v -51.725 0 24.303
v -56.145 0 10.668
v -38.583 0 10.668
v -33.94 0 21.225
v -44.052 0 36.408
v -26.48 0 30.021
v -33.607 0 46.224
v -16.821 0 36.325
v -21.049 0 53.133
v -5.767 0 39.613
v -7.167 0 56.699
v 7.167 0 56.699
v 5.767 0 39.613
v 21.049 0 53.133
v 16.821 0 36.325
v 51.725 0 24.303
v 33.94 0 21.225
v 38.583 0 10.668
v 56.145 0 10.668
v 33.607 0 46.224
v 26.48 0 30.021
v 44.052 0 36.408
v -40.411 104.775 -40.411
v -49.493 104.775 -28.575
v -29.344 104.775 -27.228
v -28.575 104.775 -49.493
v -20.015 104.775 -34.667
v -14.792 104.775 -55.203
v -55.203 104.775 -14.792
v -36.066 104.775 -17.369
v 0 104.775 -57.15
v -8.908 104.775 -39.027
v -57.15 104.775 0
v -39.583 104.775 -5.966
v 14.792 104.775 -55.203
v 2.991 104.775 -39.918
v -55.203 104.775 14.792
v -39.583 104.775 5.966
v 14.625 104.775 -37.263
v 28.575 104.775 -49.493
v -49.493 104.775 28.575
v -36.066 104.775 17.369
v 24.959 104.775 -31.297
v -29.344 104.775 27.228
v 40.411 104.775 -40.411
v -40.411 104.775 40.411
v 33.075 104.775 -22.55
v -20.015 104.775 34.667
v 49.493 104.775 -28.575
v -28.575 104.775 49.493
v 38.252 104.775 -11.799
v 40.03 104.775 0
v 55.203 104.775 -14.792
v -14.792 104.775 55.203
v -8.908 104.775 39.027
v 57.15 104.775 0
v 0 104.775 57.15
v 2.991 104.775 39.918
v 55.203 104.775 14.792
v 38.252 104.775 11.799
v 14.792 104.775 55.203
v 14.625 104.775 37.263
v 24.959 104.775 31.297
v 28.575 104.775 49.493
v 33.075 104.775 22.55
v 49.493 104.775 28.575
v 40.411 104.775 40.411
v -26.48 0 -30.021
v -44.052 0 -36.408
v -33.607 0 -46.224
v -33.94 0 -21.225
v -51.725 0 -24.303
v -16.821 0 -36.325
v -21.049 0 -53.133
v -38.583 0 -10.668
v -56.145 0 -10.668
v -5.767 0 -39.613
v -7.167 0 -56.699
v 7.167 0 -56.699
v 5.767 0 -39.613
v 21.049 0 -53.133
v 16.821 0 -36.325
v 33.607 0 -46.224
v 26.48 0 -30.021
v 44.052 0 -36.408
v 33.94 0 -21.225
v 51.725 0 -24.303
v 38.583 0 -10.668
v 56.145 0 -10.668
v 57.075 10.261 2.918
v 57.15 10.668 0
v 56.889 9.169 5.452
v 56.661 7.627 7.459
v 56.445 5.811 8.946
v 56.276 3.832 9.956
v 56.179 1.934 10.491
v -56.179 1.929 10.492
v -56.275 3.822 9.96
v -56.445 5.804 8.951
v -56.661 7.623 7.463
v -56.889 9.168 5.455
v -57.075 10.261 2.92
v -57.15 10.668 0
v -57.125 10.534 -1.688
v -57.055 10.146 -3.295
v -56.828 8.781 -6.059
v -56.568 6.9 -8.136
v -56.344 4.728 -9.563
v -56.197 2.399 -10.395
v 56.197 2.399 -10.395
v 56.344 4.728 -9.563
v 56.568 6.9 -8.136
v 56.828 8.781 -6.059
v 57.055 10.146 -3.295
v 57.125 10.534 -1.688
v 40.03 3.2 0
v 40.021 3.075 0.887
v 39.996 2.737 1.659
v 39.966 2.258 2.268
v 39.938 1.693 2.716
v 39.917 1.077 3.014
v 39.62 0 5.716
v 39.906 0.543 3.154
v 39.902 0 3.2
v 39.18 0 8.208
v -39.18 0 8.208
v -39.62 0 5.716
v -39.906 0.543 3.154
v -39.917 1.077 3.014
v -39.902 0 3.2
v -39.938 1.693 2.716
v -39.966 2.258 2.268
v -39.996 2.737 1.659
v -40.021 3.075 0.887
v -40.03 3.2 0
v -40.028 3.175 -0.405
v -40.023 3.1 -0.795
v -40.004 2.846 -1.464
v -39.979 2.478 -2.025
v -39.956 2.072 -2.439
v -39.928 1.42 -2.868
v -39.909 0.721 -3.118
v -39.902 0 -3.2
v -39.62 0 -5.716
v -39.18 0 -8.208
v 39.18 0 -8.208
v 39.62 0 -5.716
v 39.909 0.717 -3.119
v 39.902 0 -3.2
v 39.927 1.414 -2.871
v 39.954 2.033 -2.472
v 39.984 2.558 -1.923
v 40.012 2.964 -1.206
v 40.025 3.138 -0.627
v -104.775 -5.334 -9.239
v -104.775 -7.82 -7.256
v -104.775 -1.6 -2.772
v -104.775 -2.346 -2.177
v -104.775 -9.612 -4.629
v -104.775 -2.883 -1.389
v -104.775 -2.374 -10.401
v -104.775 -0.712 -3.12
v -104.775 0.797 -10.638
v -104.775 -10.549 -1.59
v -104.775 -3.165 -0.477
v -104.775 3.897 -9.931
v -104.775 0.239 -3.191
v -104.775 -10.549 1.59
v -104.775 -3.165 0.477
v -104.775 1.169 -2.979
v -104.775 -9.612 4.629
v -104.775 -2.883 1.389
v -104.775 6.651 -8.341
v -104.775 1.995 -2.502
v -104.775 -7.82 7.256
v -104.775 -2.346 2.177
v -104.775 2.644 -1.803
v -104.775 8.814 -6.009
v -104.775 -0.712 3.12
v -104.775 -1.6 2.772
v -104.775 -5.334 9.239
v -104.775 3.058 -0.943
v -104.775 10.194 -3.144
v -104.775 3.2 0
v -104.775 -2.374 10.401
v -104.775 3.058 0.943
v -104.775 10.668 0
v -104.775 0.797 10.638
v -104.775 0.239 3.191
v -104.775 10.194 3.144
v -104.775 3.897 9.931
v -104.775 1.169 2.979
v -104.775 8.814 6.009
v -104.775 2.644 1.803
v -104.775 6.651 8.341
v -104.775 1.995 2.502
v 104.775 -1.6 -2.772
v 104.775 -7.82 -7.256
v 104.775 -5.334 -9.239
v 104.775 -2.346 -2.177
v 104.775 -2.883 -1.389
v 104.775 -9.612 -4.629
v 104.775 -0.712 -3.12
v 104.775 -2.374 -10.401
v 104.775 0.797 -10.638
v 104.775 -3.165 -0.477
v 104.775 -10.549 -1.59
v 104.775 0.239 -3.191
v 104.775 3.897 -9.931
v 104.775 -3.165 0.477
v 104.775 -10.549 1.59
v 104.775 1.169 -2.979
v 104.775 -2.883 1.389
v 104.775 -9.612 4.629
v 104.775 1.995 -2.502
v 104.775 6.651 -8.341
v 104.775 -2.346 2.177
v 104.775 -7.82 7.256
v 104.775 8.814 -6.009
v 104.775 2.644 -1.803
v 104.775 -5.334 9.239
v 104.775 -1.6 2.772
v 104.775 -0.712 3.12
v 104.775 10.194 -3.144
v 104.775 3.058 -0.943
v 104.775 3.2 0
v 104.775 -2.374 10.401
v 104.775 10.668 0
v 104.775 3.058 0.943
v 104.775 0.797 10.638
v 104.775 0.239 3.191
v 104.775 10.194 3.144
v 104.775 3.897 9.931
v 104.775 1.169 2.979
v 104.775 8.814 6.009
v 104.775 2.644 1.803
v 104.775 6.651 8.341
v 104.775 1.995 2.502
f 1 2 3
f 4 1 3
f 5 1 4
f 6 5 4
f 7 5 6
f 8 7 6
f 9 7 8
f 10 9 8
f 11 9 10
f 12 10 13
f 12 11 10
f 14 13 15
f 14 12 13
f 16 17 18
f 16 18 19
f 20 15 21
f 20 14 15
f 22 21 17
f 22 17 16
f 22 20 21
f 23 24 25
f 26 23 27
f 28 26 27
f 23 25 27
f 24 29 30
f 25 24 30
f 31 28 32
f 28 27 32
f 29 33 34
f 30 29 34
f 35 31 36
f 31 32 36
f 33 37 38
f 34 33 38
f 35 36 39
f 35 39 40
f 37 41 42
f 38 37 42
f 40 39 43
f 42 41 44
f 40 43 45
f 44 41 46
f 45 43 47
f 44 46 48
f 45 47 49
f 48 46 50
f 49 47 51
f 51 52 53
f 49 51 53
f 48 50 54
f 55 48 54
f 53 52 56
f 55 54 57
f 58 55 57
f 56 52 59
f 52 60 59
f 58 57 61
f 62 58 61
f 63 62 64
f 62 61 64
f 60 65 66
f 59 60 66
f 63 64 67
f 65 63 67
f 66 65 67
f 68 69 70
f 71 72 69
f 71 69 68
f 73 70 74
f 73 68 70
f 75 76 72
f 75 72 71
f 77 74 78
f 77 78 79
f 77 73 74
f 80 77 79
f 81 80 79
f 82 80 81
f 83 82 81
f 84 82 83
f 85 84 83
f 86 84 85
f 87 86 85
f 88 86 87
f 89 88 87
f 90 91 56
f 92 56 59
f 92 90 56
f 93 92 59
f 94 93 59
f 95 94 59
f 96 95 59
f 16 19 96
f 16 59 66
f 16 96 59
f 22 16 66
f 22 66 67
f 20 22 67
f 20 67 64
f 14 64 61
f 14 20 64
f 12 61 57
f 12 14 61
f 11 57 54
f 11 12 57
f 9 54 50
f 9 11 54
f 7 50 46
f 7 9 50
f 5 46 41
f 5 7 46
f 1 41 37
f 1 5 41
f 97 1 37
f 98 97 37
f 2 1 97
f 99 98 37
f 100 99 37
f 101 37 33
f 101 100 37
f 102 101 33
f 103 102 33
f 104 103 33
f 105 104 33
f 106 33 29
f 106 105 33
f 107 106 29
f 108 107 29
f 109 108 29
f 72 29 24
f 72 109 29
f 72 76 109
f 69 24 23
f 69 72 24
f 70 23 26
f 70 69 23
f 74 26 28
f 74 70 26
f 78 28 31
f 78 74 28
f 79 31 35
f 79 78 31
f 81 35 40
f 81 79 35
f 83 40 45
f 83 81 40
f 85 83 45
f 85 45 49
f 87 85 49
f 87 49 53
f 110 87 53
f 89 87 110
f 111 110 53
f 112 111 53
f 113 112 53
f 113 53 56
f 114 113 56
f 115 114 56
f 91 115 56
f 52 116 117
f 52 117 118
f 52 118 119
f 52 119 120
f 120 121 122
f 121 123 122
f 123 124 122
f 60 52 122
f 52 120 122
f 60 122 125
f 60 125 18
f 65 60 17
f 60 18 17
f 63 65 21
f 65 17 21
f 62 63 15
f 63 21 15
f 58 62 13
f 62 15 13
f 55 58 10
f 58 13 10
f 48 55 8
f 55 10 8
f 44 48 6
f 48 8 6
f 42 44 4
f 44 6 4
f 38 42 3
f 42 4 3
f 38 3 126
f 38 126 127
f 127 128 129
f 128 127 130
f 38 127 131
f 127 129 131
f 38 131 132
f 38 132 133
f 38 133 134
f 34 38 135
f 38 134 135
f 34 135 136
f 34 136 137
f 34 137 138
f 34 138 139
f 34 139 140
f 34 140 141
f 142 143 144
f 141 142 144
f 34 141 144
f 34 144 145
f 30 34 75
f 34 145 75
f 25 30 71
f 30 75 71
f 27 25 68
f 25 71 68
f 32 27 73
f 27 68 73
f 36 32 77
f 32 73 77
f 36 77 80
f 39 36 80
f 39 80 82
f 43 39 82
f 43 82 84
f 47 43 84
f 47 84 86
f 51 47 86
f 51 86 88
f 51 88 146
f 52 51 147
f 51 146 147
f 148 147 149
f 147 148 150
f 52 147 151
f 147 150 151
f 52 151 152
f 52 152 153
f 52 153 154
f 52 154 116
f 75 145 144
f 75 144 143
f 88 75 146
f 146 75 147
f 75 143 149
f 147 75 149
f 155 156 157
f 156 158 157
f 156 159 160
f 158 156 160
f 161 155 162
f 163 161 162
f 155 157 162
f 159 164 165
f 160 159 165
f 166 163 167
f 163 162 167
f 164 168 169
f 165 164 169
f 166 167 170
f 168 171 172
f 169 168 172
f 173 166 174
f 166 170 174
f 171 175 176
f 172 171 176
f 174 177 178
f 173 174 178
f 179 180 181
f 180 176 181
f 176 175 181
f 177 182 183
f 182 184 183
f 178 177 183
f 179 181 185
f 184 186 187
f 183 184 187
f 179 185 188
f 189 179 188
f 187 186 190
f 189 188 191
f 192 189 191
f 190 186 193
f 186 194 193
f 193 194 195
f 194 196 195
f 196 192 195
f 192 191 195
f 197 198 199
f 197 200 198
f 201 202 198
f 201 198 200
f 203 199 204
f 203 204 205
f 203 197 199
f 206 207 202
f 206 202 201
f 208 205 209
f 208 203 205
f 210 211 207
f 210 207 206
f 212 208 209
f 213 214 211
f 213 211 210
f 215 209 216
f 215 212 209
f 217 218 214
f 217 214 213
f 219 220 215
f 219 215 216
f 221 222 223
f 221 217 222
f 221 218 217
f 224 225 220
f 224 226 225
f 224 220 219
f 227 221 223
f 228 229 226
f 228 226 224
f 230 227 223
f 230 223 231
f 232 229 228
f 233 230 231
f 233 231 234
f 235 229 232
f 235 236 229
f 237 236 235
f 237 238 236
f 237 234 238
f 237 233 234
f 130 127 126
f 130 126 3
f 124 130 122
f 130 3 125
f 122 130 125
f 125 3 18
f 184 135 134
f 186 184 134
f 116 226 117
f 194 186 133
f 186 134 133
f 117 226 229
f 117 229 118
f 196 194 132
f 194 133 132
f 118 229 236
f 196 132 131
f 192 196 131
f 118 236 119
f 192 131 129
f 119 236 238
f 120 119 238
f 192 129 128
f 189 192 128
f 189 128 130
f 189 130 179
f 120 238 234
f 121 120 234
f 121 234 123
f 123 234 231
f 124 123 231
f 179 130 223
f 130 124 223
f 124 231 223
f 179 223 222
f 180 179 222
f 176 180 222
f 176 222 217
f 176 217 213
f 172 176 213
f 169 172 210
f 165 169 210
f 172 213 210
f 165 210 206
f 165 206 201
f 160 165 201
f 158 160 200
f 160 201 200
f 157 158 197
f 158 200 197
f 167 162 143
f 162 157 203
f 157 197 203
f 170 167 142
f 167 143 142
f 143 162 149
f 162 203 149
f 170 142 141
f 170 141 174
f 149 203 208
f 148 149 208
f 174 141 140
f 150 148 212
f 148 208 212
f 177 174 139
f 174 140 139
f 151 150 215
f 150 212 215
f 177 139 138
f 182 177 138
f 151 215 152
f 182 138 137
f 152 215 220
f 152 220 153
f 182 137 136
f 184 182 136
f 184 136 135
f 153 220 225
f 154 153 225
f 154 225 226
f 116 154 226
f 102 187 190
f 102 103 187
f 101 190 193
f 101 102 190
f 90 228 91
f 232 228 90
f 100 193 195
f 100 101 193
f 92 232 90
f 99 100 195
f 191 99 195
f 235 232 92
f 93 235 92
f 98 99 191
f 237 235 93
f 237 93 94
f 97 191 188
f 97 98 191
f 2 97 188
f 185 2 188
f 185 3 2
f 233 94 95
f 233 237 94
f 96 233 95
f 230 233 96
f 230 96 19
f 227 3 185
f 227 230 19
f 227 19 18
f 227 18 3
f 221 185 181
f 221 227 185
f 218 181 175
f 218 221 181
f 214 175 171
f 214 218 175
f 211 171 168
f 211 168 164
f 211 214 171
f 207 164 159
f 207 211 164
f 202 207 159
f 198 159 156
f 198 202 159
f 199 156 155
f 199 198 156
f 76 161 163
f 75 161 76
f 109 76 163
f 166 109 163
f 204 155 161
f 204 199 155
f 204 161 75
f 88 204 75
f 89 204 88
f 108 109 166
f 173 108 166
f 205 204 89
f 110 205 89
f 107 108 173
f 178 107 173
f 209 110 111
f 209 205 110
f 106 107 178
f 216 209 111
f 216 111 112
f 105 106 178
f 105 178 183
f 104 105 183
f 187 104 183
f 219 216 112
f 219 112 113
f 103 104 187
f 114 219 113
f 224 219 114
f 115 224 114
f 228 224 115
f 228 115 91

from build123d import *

# Parameters (mm, degrees)
F2_R          = 10.668
F3_DEPTH      = 104.775
F3_DEPTH_BACK = 104.775
F0_R          = 57.15
F4_DEPTH      = 104.775
F5_R          = 3.2004
F6_DEPTH      = 209.551
F1_R          = 40.0304
F7_DEPTH      = 104.776


with BuildPart() as f3:
    # F2 (on Right) → F3 (new body, two sides)
    with BuildSketch(Plane.YZ) as f3_sk:
        Circle(F2_R)
    extrude(amount=F3_DEPTH)
    extrude(f3_sk.sketch, amount=-F3_DEPTH_BACK)

    # F0 (on Front) → F4 (join)
    with BuildSketch(Plane.XZ):
        Circle(F0_R)
    extrude(amount=-F4_DEPTH)

    # F5 (on face) → F6 (cut, through all)
    with BuildSketch(Plane.YZ.offset(104.775)):
        Circle(F5_R)
    extrude(amount=-F6_DEPTH, mode=Mode.SUBTRACT)

    # F1 (on Front) → F7 (cut, through all)
    with BuildSketch(Plane.XZ):
        Circle(F1_R)
    extrude(amount=-F7_DEPTH, mode=Mode.SUBTRACT)


solid = f3.part
